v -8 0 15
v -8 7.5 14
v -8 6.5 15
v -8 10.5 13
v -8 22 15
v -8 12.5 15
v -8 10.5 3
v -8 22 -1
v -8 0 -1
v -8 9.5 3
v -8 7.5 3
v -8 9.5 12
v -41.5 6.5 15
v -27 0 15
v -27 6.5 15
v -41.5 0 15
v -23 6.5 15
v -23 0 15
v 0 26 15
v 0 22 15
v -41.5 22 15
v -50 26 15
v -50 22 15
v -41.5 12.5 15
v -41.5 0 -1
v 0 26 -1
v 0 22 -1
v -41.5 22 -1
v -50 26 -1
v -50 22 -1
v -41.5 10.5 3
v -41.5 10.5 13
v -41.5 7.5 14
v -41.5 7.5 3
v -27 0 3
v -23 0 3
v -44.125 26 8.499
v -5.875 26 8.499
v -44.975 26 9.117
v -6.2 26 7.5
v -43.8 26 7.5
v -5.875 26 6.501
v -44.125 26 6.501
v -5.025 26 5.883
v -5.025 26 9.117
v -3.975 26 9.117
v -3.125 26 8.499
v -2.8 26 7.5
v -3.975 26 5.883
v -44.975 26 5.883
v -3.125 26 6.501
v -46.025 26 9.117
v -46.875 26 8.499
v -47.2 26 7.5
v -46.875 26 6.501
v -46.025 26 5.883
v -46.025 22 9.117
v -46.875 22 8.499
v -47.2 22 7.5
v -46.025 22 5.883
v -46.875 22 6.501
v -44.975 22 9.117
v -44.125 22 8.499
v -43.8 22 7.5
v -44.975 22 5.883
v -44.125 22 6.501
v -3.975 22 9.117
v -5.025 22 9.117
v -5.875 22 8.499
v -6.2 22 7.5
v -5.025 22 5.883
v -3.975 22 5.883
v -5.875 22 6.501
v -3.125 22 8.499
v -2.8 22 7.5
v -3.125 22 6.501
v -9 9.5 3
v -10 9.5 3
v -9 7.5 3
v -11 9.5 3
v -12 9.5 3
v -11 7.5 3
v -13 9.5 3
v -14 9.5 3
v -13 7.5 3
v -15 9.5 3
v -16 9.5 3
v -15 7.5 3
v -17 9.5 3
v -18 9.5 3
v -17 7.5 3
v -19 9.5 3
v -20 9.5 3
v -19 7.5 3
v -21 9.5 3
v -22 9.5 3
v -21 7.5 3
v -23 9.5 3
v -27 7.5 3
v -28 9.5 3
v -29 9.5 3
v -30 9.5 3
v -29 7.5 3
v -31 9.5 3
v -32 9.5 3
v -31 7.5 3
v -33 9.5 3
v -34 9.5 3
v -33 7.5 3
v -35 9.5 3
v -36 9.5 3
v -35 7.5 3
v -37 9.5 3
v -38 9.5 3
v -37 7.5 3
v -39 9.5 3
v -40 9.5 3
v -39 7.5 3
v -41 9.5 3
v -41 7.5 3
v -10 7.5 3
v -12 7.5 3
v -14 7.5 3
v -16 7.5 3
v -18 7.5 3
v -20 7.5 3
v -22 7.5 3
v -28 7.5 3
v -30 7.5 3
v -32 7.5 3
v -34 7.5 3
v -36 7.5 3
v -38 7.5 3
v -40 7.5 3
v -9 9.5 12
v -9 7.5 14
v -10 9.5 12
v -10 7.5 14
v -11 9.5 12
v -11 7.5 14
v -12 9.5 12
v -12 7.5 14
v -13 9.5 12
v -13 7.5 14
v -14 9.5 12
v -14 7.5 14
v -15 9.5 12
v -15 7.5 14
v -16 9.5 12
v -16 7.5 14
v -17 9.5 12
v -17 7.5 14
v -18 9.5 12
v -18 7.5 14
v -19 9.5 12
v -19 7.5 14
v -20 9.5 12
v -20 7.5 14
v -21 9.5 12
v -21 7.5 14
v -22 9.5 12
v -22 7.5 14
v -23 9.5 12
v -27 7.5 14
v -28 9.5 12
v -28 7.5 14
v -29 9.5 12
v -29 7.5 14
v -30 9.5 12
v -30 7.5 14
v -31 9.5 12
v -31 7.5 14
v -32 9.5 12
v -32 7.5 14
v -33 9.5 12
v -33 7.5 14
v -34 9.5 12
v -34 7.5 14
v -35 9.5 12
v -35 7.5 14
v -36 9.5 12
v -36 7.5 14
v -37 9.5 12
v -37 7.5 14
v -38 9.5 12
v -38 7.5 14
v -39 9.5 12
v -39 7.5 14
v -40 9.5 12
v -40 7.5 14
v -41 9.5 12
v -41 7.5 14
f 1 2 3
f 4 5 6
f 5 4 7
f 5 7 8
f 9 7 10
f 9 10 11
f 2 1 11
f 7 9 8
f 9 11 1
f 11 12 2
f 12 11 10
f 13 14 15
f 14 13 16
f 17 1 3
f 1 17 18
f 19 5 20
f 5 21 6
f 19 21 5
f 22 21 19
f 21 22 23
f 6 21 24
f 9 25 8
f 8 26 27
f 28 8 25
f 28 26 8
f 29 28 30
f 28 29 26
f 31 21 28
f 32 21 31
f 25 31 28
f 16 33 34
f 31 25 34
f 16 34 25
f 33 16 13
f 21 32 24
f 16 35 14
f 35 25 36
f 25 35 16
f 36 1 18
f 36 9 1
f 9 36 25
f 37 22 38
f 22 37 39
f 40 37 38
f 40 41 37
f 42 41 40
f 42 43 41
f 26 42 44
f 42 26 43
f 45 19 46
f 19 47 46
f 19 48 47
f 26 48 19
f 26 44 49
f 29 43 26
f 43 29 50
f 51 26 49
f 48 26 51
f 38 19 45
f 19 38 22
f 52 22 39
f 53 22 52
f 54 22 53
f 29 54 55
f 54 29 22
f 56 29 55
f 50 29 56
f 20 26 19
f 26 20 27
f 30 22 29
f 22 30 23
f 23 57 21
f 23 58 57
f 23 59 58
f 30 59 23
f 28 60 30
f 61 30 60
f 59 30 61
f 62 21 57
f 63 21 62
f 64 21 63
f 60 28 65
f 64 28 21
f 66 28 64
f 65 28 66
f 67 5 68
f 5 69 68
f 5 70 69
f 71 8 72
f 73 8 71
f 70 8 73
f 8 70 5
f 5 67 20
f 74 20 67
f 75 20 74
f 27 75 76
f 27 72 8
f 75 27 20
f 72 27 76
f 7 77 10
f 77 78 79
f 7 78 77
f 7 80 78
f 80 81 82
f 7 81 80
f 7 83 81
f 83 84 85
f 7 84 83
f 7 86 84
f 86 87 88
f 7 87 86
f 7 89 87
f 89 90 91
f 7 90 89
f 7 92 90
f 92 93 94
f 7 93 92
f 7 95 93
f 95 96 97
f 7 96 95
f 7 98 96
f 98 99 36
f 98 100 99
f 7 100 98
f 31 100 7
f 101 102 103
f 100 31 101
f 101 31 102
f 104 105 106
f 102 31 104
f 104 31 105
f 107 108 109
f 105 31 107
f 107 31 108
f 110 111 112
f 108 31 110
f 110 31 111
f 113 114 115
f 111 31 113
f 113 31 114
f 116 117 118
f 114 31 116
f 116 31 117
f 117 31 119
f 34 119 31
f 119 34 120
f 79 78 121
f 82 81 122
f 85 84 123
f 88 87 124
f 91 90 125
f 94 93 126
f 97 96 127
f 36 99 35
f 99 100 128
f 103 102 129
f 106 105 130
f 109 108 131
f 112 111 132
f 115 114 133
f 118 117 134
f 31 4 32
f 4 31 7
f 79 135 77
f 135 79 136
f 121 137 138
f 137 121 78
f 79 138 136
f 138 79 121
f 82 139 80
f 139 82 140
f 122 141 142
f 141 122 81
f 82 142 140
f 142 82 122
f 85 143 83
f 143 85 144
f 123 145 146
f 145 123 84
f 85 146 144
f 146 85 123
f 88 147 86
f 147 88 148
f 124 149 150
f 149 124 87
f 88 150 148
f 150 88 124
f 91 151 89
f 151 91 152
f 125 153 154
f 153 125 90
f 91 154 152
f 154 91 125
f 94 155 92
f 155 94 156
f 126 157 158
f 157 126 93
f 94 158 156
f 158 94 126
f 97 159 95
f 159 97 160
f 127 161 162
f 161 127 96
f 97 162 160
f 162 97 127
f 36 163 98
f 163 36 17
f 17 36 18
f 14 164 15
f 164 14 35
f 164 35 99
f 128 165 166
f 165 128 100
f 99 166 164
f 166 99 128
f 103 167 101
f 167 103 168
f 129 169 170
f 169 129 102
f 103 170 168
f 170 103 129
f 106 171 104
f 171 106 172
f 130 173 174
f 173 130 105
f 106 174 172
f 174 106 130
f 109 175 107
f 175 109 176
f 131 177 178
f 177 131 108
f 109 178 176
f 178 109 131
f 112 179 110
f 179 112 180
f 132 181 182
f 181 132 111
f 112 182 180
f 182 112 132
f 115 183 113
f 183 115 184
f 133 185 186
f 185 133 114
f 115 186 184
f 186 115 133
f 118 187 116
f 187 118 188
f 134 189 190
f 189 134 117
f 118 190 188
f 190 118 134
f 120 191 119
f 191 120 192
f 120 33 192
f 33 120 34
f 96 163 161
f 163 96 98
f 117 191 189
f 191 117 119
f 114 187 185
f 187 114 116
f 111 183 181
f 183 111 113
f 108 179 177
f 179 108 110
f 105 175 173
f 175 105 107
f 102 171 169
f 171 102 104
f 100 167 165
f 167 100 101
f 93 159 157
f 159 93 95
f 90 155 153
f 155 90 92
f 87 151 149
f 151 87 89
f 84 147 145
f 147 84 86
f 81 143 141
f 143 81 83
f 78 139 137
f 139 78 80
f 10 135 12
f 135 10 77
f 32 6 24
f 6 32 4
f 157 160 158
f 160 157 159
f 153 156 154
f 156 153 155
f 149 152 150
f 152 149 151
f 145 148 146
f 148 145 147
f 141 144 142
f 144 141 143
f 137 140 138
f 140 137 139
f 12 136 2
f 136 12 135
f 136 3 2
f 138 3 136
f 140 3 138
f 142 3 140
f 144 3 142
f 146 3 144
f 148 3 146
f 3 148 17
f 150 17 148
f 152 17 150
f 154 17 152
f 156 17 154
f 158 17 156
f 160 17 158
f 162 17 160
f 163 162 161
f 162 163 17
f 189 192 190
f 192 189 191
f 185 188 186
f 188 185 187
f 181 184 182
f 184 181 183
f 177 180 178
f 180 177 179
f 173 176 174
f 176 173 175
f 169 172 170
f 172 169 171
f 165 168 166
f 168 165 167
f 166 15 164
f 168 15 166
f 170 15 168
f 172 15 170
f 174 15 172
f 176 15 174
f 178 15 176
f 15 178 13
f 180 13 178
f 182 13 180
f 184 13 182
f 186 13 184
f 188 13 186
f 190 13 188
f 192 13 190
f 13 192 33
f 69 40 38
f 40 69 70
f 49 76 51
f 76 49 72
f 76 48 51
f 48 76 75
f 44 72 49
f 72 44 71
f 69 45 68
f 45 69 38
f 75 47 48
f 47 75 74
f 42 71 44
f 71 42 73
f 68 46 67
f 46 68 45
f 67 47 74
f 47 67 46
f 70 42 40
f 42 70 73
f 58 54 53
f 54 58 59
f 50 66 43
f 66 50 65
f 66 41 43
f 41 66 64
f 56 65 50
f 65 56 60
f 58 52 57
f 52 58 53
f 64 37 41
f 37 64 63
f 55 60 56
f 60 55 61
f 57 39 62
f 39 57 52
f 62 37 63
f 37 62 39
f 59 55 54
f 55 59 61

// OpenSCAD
// PRUSA iteration3
// Y belt holder
// GNU GPL v3
// Josef Průša <iam@josefprusa.cz> and contributors
// http://www.reprap.org/wiki/Prusa_Mendel
// http://prusamendel.org


module belt_holder_base(){
 translate([-33-8.5,0,-1]) cube([33.5,15,16]); 
 translate([-33-8.5,11,-1]) cube([33.5,15,16]);
 translate([-50,22,-1]) cube([50,4,16]);	
}

module belt_holder_beltcut(){
 position_tweak=-0.2;
 // Belt slit
 translate([-66,-0.5+10,3]) cube([67,1,15]);
 // Smooth insert cutout
 translate([-66,-0.5+10,12]) rotate([45,0,0]) cube([67,15,15]);

 // Individual teeth
 for (i = [0 : 23]) {
    // GT2 variant
    translate([0 - i*2, -0.5 + 8, 3]) cube([1, 3, 15]);
    // original 
    // translate([0-i*3+position_tweak,-0.5+8,3]) cube([1.7,3,15]);
 }

 // Middle opening
 translate([-2-25,-1,3]) cube([4,11,15]);	
}

module belt_holder_holes(){
 translate([-4.5,0,7.5]) rotate([-90,0,0]) cylinder(h=30, r=1.7, $fn=10);
 translate([-45.5,0,7.5]) rotate([-90,0,0]) cylinder(h=30, r=1.7, $fn=10);
}

// Final part
module belt_holder(){
 difference(){
  belt_holder_base();
  belt_holder_beltcut();
  belt_holder_holes();
 }
}

belt_holder();
